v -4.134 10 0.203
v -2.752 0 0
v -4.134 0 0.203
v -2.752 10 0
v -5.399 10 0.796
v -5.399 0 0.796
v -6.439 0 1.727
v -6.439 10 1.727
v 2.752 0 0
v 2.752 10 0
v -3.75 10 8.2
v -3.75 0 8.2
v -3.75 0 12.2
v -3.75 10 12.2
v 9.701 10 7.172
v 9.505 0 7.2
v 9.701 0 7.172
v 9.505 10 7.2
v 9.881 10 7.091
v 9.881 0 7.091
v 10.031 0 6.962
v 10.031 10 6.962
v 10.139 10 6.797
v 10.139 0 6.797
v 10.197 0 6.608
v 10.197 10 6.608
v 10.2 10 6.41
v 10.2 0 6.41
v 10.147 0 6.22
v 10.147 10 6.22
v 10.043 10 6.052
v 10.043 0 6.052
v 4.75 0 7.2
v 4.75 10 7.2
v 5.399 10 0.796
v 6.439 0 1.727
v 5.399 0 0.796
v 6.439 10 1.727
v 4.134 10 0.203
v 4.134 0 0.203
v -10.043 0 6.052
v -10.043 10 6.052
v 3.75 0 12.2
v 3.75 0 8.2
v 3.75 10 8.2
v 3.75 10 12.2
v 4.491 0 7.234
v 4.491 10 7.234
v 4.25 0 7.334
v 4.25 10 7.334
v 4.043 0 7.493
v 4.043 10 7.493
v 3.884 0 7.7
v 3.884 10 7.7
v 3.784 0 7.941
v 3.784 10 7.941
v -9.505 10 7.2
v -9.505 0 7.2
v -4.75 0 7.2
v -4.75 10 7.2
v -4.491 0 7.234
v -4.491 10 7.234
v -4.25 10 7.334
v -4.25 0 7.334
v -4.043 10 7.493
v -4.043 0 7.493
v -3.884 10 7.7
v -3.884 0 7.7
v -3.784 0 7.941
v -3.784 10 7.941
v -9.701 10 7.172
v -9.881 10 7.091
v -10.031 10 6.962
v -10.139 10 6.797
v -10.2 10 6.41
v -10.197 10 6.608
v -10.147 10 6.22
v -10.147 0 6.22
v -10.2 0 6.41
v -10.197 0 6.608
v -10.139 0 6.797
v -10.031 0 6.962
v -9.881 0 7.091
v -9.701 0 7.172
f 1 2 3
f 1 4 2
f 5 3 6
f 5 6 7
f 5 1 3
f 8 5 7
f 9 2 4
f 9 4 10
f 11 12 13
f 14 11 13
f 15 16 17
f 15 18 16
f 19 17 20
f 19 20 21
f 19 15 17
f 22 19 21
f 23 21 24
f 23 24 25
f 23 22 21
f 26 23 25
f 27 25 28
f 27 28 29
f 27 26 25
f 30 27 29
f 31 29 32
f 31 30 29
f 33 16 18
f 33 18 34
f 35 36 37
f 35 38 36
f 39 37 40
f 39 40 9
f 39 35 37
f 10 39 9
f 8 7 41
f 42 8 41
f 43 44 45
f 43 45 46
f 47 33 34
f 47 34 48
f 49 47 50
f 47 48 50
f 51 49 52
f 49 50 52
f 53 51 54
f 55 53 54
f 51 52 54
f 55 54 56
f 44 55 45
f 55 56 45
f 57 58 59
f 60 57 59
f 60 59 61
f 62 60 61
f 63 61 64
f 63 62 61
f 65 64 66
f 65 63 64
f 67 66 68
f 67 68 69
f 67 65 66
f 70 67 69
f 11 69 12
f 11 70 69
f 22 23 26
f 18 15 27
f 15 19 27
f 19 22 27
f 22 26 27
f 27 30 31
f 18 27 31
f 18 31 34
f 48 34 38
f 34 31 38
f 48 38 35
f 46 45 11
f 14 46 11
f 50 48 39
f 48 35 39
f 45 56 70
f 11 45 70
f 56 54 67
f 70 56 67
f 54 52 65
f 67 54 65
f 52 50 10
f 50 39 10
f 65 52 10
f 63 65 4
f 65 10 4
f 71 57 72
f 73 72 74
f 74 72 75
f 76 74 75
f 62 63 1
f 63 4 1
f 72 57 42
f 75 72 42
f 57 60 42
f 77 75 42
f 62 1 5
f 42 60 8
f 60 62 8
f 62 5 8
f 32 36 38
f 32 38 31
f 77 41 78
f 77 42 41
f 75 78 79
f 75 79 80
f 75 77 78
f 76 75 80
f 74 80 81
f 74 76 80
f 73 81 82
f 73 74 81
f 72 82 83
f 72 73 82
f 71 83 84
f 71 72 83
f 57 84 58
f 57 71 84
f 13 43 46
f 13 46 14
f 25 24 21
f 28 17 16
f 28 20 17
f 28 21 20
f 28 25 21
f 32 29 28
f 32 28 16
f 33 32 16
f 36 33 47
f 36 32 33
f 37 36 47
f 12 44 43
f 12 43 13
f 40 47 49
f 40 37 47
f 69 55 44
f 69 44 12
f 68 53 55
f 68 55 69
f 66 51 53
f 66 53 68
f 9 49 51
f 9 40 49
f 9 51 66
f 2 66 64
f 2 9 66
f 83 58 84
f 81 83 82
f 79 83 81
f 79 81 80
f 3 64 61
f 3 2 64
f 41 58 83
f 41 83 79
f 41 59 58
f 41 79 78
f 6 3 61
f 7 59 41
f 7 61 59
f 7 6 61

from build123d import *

# Parameters (mm, degrees)
BOSS_EXTRUDE1_DEPTH  = 10
FILLET1_R            = 0.7
FILLET2_R            = 1
FILLET1_OF_MIRROR1_R = 0.7
FILLET2_OF_MIRROR1_R = 1
FILLET3_R            = 4.8


with BuildPart() as part:
    # Sketch1 → Boss-Extrude1 (new body)
    with BuildSketch(Plane(origin=(0, 0, 0), x_dir=(1, 0, 0), z_dir=(0, 1, 0))):
        Polygon((0, 0), (-5, 0), (-11, -7.2), (-3.75, -7.2), (-3.75, -12.2), (0, -12.2), align=None)
    boss_extrude1 = extrude(amount=BOSS_EXTRUDE1_DEPTH)

    # Fillet1
    fillet1_edges = [part.edges().sort_by_distance(p)[0] for p in [
        (-11, 5, 7.2),
    ]]
    fillet(fillet1_edges, radius=FILLET1_R)

    # Fillet2
    fillet2_edges = [part.edges().sort_by_distance(p)[0] for p in [
        (-3.75, 5, 7.2),
    ]]
    fillet(fillet2_edges, radius=FILLET2_R)

    # Mirror1: Boss-Extrude1 across plane
    add(boss_extrude1.mirror(Plane(origin=(0, 10, 12.2), x_dir=(0, 0, 1), z_dir=(-1, 0, 0))))

    # Fillet1 of Mirror1
    fillet1_of_mirror1_edges = [part.edges().sort_by_distance(p)[0] for p in [
        (11, 5, 7.2),
    ]]
    fillet(fillet1_of_mirror1_edges, radius=FILLET1_OF_MIRROR1_R)

    # Fillet2 of Mirror1
    fillet2_of_mirror1_edges = [part.edges().sort_by_distance(p)[0] for p in [
        (3.75, 5, 7.2),
    ]]
    fillet(fillet2_of_mirror1_edges, radius=FILLET2_OF_MIRROR1_R)

    # Fillet3
    fillet3_edges = [part.edges().sort_by_distance(p)[0] for p in [
        (-5, 5, 0),
        (5, 5, 0),
    ]]
    fillet(fillet3_edges, radius=FILLET3_R)


solid = part.part
